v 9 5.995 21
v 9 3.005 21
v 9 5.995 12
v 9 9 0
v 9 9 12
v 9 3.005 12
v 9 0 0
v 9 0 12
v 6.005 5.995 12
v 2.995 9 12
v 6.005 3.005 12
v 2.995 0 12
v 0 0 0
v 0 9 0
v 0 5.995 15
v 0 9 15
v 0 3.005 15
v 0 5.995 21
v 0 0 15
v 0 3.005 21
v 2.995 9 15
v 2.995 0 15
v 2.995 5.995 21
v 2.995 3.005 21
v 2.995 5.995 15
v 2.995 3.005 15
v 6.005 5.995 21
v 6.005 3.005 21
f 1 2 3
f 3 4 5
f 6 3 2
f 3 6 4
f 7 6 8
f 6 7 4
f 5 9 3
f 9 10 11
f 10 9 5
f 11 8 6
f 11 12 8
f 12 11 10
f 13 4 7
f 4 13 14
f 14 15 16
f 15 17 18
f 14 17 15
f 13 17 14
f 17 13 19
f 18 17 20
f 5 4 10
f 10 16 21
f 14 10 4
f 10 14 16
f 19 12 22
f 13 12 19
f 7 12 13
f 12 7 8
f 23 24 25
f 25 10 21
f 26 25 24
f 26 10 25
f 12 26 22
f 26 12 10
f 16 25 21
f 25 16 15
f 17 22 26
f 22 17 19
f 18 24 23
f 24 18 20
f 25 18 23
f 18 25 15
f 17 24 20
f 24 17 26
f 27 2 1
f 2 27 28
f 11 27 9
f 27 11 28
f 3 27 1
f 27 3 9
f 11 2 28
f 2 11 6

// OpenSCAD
//this is the user inputed width of the square shaft
width=9;
//this is the user inputed height of the solid shaft (not including the joint)
height=12;
//this is the user inputed tolerance. may be printer specific. incorporating about 0.01" gap works well on my Makerbot Replicator
tolerance=0.01;

module joint(width, height){
    cube([width, width, height]);
    translate([0,0,height]){cube([width/3-tolerance/2,width, width/3]);}
    translate([0,width/3+tolerance/2,height+width/3]){
        cube([width/3-tolerance/2,width/3-tolerance,2*width/3]);}
    translate([2*width/3+tolerance/2,width/3+tolerance/2,height]){
        cube([width/3-tolerance/2,width/3-tolerance,width]);}

}

module piece1(width, height1){
    joint(width,height1);
}

piece1(width,height);
